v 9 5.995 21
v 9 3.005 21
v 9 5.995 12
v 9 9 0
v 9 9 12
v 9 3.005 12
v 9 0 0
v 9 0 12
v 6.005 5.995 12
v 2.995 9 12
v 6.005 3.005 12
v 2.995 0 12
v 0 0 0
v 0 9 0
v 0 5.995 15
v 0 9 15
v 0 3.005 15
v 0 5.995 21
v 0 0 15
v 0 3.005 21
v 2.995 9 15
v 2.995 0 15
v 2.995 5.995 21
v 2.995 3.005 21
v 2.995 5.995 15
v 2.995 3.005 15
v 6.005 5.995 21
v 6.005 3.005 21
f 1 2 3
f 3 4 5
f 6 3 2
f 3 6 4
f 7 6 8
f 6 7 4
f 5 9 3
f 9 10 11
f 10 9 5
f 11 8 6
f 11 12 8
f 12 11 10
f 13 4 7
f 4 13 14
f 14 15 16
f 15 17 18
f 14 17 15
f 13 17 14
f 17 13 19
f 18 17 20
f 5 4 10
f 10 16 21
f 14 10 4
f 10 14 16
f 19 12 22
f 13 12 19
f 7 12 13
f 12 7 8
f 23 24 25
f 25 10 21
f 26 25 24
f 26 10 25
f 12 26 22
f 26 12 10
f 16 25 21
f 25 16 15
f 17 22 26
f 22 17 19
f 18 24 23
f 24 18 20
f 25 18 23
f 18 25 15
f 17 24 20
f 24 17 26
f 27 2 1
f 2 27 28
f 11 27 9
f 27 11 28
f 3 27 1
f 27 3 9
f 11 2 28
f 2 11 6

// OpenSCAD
//this is the user inputed width of the square shaft
width=9;
//this is the user inputed height of the solid shaft (not including the joint)
height=12;
//this is the user inputed tolerance. may be printer specific. incorporating about 0.01" gap works well on my Makerbot Replicator
tolerance=0.01;

module joint(width, height){
    cube([width, width, height]);
    translate([0,0,height]){cube([width/3-tolerance/2,width, width/3]);}
    translate([0,width/3+tolerance/2,height+width/3]){
        cube([width/3-tolerance/2,width/3-tolerance,2*width/3]);}
    translate([2*width/3+tolerance/2,width/3+tolerance/2,height]){
        cube([width/3-tolerance/2,width/3-tolerance,width]);}

}

module piece1(width, height1){
    joint(width,height1);
}

piece1(width,height);
